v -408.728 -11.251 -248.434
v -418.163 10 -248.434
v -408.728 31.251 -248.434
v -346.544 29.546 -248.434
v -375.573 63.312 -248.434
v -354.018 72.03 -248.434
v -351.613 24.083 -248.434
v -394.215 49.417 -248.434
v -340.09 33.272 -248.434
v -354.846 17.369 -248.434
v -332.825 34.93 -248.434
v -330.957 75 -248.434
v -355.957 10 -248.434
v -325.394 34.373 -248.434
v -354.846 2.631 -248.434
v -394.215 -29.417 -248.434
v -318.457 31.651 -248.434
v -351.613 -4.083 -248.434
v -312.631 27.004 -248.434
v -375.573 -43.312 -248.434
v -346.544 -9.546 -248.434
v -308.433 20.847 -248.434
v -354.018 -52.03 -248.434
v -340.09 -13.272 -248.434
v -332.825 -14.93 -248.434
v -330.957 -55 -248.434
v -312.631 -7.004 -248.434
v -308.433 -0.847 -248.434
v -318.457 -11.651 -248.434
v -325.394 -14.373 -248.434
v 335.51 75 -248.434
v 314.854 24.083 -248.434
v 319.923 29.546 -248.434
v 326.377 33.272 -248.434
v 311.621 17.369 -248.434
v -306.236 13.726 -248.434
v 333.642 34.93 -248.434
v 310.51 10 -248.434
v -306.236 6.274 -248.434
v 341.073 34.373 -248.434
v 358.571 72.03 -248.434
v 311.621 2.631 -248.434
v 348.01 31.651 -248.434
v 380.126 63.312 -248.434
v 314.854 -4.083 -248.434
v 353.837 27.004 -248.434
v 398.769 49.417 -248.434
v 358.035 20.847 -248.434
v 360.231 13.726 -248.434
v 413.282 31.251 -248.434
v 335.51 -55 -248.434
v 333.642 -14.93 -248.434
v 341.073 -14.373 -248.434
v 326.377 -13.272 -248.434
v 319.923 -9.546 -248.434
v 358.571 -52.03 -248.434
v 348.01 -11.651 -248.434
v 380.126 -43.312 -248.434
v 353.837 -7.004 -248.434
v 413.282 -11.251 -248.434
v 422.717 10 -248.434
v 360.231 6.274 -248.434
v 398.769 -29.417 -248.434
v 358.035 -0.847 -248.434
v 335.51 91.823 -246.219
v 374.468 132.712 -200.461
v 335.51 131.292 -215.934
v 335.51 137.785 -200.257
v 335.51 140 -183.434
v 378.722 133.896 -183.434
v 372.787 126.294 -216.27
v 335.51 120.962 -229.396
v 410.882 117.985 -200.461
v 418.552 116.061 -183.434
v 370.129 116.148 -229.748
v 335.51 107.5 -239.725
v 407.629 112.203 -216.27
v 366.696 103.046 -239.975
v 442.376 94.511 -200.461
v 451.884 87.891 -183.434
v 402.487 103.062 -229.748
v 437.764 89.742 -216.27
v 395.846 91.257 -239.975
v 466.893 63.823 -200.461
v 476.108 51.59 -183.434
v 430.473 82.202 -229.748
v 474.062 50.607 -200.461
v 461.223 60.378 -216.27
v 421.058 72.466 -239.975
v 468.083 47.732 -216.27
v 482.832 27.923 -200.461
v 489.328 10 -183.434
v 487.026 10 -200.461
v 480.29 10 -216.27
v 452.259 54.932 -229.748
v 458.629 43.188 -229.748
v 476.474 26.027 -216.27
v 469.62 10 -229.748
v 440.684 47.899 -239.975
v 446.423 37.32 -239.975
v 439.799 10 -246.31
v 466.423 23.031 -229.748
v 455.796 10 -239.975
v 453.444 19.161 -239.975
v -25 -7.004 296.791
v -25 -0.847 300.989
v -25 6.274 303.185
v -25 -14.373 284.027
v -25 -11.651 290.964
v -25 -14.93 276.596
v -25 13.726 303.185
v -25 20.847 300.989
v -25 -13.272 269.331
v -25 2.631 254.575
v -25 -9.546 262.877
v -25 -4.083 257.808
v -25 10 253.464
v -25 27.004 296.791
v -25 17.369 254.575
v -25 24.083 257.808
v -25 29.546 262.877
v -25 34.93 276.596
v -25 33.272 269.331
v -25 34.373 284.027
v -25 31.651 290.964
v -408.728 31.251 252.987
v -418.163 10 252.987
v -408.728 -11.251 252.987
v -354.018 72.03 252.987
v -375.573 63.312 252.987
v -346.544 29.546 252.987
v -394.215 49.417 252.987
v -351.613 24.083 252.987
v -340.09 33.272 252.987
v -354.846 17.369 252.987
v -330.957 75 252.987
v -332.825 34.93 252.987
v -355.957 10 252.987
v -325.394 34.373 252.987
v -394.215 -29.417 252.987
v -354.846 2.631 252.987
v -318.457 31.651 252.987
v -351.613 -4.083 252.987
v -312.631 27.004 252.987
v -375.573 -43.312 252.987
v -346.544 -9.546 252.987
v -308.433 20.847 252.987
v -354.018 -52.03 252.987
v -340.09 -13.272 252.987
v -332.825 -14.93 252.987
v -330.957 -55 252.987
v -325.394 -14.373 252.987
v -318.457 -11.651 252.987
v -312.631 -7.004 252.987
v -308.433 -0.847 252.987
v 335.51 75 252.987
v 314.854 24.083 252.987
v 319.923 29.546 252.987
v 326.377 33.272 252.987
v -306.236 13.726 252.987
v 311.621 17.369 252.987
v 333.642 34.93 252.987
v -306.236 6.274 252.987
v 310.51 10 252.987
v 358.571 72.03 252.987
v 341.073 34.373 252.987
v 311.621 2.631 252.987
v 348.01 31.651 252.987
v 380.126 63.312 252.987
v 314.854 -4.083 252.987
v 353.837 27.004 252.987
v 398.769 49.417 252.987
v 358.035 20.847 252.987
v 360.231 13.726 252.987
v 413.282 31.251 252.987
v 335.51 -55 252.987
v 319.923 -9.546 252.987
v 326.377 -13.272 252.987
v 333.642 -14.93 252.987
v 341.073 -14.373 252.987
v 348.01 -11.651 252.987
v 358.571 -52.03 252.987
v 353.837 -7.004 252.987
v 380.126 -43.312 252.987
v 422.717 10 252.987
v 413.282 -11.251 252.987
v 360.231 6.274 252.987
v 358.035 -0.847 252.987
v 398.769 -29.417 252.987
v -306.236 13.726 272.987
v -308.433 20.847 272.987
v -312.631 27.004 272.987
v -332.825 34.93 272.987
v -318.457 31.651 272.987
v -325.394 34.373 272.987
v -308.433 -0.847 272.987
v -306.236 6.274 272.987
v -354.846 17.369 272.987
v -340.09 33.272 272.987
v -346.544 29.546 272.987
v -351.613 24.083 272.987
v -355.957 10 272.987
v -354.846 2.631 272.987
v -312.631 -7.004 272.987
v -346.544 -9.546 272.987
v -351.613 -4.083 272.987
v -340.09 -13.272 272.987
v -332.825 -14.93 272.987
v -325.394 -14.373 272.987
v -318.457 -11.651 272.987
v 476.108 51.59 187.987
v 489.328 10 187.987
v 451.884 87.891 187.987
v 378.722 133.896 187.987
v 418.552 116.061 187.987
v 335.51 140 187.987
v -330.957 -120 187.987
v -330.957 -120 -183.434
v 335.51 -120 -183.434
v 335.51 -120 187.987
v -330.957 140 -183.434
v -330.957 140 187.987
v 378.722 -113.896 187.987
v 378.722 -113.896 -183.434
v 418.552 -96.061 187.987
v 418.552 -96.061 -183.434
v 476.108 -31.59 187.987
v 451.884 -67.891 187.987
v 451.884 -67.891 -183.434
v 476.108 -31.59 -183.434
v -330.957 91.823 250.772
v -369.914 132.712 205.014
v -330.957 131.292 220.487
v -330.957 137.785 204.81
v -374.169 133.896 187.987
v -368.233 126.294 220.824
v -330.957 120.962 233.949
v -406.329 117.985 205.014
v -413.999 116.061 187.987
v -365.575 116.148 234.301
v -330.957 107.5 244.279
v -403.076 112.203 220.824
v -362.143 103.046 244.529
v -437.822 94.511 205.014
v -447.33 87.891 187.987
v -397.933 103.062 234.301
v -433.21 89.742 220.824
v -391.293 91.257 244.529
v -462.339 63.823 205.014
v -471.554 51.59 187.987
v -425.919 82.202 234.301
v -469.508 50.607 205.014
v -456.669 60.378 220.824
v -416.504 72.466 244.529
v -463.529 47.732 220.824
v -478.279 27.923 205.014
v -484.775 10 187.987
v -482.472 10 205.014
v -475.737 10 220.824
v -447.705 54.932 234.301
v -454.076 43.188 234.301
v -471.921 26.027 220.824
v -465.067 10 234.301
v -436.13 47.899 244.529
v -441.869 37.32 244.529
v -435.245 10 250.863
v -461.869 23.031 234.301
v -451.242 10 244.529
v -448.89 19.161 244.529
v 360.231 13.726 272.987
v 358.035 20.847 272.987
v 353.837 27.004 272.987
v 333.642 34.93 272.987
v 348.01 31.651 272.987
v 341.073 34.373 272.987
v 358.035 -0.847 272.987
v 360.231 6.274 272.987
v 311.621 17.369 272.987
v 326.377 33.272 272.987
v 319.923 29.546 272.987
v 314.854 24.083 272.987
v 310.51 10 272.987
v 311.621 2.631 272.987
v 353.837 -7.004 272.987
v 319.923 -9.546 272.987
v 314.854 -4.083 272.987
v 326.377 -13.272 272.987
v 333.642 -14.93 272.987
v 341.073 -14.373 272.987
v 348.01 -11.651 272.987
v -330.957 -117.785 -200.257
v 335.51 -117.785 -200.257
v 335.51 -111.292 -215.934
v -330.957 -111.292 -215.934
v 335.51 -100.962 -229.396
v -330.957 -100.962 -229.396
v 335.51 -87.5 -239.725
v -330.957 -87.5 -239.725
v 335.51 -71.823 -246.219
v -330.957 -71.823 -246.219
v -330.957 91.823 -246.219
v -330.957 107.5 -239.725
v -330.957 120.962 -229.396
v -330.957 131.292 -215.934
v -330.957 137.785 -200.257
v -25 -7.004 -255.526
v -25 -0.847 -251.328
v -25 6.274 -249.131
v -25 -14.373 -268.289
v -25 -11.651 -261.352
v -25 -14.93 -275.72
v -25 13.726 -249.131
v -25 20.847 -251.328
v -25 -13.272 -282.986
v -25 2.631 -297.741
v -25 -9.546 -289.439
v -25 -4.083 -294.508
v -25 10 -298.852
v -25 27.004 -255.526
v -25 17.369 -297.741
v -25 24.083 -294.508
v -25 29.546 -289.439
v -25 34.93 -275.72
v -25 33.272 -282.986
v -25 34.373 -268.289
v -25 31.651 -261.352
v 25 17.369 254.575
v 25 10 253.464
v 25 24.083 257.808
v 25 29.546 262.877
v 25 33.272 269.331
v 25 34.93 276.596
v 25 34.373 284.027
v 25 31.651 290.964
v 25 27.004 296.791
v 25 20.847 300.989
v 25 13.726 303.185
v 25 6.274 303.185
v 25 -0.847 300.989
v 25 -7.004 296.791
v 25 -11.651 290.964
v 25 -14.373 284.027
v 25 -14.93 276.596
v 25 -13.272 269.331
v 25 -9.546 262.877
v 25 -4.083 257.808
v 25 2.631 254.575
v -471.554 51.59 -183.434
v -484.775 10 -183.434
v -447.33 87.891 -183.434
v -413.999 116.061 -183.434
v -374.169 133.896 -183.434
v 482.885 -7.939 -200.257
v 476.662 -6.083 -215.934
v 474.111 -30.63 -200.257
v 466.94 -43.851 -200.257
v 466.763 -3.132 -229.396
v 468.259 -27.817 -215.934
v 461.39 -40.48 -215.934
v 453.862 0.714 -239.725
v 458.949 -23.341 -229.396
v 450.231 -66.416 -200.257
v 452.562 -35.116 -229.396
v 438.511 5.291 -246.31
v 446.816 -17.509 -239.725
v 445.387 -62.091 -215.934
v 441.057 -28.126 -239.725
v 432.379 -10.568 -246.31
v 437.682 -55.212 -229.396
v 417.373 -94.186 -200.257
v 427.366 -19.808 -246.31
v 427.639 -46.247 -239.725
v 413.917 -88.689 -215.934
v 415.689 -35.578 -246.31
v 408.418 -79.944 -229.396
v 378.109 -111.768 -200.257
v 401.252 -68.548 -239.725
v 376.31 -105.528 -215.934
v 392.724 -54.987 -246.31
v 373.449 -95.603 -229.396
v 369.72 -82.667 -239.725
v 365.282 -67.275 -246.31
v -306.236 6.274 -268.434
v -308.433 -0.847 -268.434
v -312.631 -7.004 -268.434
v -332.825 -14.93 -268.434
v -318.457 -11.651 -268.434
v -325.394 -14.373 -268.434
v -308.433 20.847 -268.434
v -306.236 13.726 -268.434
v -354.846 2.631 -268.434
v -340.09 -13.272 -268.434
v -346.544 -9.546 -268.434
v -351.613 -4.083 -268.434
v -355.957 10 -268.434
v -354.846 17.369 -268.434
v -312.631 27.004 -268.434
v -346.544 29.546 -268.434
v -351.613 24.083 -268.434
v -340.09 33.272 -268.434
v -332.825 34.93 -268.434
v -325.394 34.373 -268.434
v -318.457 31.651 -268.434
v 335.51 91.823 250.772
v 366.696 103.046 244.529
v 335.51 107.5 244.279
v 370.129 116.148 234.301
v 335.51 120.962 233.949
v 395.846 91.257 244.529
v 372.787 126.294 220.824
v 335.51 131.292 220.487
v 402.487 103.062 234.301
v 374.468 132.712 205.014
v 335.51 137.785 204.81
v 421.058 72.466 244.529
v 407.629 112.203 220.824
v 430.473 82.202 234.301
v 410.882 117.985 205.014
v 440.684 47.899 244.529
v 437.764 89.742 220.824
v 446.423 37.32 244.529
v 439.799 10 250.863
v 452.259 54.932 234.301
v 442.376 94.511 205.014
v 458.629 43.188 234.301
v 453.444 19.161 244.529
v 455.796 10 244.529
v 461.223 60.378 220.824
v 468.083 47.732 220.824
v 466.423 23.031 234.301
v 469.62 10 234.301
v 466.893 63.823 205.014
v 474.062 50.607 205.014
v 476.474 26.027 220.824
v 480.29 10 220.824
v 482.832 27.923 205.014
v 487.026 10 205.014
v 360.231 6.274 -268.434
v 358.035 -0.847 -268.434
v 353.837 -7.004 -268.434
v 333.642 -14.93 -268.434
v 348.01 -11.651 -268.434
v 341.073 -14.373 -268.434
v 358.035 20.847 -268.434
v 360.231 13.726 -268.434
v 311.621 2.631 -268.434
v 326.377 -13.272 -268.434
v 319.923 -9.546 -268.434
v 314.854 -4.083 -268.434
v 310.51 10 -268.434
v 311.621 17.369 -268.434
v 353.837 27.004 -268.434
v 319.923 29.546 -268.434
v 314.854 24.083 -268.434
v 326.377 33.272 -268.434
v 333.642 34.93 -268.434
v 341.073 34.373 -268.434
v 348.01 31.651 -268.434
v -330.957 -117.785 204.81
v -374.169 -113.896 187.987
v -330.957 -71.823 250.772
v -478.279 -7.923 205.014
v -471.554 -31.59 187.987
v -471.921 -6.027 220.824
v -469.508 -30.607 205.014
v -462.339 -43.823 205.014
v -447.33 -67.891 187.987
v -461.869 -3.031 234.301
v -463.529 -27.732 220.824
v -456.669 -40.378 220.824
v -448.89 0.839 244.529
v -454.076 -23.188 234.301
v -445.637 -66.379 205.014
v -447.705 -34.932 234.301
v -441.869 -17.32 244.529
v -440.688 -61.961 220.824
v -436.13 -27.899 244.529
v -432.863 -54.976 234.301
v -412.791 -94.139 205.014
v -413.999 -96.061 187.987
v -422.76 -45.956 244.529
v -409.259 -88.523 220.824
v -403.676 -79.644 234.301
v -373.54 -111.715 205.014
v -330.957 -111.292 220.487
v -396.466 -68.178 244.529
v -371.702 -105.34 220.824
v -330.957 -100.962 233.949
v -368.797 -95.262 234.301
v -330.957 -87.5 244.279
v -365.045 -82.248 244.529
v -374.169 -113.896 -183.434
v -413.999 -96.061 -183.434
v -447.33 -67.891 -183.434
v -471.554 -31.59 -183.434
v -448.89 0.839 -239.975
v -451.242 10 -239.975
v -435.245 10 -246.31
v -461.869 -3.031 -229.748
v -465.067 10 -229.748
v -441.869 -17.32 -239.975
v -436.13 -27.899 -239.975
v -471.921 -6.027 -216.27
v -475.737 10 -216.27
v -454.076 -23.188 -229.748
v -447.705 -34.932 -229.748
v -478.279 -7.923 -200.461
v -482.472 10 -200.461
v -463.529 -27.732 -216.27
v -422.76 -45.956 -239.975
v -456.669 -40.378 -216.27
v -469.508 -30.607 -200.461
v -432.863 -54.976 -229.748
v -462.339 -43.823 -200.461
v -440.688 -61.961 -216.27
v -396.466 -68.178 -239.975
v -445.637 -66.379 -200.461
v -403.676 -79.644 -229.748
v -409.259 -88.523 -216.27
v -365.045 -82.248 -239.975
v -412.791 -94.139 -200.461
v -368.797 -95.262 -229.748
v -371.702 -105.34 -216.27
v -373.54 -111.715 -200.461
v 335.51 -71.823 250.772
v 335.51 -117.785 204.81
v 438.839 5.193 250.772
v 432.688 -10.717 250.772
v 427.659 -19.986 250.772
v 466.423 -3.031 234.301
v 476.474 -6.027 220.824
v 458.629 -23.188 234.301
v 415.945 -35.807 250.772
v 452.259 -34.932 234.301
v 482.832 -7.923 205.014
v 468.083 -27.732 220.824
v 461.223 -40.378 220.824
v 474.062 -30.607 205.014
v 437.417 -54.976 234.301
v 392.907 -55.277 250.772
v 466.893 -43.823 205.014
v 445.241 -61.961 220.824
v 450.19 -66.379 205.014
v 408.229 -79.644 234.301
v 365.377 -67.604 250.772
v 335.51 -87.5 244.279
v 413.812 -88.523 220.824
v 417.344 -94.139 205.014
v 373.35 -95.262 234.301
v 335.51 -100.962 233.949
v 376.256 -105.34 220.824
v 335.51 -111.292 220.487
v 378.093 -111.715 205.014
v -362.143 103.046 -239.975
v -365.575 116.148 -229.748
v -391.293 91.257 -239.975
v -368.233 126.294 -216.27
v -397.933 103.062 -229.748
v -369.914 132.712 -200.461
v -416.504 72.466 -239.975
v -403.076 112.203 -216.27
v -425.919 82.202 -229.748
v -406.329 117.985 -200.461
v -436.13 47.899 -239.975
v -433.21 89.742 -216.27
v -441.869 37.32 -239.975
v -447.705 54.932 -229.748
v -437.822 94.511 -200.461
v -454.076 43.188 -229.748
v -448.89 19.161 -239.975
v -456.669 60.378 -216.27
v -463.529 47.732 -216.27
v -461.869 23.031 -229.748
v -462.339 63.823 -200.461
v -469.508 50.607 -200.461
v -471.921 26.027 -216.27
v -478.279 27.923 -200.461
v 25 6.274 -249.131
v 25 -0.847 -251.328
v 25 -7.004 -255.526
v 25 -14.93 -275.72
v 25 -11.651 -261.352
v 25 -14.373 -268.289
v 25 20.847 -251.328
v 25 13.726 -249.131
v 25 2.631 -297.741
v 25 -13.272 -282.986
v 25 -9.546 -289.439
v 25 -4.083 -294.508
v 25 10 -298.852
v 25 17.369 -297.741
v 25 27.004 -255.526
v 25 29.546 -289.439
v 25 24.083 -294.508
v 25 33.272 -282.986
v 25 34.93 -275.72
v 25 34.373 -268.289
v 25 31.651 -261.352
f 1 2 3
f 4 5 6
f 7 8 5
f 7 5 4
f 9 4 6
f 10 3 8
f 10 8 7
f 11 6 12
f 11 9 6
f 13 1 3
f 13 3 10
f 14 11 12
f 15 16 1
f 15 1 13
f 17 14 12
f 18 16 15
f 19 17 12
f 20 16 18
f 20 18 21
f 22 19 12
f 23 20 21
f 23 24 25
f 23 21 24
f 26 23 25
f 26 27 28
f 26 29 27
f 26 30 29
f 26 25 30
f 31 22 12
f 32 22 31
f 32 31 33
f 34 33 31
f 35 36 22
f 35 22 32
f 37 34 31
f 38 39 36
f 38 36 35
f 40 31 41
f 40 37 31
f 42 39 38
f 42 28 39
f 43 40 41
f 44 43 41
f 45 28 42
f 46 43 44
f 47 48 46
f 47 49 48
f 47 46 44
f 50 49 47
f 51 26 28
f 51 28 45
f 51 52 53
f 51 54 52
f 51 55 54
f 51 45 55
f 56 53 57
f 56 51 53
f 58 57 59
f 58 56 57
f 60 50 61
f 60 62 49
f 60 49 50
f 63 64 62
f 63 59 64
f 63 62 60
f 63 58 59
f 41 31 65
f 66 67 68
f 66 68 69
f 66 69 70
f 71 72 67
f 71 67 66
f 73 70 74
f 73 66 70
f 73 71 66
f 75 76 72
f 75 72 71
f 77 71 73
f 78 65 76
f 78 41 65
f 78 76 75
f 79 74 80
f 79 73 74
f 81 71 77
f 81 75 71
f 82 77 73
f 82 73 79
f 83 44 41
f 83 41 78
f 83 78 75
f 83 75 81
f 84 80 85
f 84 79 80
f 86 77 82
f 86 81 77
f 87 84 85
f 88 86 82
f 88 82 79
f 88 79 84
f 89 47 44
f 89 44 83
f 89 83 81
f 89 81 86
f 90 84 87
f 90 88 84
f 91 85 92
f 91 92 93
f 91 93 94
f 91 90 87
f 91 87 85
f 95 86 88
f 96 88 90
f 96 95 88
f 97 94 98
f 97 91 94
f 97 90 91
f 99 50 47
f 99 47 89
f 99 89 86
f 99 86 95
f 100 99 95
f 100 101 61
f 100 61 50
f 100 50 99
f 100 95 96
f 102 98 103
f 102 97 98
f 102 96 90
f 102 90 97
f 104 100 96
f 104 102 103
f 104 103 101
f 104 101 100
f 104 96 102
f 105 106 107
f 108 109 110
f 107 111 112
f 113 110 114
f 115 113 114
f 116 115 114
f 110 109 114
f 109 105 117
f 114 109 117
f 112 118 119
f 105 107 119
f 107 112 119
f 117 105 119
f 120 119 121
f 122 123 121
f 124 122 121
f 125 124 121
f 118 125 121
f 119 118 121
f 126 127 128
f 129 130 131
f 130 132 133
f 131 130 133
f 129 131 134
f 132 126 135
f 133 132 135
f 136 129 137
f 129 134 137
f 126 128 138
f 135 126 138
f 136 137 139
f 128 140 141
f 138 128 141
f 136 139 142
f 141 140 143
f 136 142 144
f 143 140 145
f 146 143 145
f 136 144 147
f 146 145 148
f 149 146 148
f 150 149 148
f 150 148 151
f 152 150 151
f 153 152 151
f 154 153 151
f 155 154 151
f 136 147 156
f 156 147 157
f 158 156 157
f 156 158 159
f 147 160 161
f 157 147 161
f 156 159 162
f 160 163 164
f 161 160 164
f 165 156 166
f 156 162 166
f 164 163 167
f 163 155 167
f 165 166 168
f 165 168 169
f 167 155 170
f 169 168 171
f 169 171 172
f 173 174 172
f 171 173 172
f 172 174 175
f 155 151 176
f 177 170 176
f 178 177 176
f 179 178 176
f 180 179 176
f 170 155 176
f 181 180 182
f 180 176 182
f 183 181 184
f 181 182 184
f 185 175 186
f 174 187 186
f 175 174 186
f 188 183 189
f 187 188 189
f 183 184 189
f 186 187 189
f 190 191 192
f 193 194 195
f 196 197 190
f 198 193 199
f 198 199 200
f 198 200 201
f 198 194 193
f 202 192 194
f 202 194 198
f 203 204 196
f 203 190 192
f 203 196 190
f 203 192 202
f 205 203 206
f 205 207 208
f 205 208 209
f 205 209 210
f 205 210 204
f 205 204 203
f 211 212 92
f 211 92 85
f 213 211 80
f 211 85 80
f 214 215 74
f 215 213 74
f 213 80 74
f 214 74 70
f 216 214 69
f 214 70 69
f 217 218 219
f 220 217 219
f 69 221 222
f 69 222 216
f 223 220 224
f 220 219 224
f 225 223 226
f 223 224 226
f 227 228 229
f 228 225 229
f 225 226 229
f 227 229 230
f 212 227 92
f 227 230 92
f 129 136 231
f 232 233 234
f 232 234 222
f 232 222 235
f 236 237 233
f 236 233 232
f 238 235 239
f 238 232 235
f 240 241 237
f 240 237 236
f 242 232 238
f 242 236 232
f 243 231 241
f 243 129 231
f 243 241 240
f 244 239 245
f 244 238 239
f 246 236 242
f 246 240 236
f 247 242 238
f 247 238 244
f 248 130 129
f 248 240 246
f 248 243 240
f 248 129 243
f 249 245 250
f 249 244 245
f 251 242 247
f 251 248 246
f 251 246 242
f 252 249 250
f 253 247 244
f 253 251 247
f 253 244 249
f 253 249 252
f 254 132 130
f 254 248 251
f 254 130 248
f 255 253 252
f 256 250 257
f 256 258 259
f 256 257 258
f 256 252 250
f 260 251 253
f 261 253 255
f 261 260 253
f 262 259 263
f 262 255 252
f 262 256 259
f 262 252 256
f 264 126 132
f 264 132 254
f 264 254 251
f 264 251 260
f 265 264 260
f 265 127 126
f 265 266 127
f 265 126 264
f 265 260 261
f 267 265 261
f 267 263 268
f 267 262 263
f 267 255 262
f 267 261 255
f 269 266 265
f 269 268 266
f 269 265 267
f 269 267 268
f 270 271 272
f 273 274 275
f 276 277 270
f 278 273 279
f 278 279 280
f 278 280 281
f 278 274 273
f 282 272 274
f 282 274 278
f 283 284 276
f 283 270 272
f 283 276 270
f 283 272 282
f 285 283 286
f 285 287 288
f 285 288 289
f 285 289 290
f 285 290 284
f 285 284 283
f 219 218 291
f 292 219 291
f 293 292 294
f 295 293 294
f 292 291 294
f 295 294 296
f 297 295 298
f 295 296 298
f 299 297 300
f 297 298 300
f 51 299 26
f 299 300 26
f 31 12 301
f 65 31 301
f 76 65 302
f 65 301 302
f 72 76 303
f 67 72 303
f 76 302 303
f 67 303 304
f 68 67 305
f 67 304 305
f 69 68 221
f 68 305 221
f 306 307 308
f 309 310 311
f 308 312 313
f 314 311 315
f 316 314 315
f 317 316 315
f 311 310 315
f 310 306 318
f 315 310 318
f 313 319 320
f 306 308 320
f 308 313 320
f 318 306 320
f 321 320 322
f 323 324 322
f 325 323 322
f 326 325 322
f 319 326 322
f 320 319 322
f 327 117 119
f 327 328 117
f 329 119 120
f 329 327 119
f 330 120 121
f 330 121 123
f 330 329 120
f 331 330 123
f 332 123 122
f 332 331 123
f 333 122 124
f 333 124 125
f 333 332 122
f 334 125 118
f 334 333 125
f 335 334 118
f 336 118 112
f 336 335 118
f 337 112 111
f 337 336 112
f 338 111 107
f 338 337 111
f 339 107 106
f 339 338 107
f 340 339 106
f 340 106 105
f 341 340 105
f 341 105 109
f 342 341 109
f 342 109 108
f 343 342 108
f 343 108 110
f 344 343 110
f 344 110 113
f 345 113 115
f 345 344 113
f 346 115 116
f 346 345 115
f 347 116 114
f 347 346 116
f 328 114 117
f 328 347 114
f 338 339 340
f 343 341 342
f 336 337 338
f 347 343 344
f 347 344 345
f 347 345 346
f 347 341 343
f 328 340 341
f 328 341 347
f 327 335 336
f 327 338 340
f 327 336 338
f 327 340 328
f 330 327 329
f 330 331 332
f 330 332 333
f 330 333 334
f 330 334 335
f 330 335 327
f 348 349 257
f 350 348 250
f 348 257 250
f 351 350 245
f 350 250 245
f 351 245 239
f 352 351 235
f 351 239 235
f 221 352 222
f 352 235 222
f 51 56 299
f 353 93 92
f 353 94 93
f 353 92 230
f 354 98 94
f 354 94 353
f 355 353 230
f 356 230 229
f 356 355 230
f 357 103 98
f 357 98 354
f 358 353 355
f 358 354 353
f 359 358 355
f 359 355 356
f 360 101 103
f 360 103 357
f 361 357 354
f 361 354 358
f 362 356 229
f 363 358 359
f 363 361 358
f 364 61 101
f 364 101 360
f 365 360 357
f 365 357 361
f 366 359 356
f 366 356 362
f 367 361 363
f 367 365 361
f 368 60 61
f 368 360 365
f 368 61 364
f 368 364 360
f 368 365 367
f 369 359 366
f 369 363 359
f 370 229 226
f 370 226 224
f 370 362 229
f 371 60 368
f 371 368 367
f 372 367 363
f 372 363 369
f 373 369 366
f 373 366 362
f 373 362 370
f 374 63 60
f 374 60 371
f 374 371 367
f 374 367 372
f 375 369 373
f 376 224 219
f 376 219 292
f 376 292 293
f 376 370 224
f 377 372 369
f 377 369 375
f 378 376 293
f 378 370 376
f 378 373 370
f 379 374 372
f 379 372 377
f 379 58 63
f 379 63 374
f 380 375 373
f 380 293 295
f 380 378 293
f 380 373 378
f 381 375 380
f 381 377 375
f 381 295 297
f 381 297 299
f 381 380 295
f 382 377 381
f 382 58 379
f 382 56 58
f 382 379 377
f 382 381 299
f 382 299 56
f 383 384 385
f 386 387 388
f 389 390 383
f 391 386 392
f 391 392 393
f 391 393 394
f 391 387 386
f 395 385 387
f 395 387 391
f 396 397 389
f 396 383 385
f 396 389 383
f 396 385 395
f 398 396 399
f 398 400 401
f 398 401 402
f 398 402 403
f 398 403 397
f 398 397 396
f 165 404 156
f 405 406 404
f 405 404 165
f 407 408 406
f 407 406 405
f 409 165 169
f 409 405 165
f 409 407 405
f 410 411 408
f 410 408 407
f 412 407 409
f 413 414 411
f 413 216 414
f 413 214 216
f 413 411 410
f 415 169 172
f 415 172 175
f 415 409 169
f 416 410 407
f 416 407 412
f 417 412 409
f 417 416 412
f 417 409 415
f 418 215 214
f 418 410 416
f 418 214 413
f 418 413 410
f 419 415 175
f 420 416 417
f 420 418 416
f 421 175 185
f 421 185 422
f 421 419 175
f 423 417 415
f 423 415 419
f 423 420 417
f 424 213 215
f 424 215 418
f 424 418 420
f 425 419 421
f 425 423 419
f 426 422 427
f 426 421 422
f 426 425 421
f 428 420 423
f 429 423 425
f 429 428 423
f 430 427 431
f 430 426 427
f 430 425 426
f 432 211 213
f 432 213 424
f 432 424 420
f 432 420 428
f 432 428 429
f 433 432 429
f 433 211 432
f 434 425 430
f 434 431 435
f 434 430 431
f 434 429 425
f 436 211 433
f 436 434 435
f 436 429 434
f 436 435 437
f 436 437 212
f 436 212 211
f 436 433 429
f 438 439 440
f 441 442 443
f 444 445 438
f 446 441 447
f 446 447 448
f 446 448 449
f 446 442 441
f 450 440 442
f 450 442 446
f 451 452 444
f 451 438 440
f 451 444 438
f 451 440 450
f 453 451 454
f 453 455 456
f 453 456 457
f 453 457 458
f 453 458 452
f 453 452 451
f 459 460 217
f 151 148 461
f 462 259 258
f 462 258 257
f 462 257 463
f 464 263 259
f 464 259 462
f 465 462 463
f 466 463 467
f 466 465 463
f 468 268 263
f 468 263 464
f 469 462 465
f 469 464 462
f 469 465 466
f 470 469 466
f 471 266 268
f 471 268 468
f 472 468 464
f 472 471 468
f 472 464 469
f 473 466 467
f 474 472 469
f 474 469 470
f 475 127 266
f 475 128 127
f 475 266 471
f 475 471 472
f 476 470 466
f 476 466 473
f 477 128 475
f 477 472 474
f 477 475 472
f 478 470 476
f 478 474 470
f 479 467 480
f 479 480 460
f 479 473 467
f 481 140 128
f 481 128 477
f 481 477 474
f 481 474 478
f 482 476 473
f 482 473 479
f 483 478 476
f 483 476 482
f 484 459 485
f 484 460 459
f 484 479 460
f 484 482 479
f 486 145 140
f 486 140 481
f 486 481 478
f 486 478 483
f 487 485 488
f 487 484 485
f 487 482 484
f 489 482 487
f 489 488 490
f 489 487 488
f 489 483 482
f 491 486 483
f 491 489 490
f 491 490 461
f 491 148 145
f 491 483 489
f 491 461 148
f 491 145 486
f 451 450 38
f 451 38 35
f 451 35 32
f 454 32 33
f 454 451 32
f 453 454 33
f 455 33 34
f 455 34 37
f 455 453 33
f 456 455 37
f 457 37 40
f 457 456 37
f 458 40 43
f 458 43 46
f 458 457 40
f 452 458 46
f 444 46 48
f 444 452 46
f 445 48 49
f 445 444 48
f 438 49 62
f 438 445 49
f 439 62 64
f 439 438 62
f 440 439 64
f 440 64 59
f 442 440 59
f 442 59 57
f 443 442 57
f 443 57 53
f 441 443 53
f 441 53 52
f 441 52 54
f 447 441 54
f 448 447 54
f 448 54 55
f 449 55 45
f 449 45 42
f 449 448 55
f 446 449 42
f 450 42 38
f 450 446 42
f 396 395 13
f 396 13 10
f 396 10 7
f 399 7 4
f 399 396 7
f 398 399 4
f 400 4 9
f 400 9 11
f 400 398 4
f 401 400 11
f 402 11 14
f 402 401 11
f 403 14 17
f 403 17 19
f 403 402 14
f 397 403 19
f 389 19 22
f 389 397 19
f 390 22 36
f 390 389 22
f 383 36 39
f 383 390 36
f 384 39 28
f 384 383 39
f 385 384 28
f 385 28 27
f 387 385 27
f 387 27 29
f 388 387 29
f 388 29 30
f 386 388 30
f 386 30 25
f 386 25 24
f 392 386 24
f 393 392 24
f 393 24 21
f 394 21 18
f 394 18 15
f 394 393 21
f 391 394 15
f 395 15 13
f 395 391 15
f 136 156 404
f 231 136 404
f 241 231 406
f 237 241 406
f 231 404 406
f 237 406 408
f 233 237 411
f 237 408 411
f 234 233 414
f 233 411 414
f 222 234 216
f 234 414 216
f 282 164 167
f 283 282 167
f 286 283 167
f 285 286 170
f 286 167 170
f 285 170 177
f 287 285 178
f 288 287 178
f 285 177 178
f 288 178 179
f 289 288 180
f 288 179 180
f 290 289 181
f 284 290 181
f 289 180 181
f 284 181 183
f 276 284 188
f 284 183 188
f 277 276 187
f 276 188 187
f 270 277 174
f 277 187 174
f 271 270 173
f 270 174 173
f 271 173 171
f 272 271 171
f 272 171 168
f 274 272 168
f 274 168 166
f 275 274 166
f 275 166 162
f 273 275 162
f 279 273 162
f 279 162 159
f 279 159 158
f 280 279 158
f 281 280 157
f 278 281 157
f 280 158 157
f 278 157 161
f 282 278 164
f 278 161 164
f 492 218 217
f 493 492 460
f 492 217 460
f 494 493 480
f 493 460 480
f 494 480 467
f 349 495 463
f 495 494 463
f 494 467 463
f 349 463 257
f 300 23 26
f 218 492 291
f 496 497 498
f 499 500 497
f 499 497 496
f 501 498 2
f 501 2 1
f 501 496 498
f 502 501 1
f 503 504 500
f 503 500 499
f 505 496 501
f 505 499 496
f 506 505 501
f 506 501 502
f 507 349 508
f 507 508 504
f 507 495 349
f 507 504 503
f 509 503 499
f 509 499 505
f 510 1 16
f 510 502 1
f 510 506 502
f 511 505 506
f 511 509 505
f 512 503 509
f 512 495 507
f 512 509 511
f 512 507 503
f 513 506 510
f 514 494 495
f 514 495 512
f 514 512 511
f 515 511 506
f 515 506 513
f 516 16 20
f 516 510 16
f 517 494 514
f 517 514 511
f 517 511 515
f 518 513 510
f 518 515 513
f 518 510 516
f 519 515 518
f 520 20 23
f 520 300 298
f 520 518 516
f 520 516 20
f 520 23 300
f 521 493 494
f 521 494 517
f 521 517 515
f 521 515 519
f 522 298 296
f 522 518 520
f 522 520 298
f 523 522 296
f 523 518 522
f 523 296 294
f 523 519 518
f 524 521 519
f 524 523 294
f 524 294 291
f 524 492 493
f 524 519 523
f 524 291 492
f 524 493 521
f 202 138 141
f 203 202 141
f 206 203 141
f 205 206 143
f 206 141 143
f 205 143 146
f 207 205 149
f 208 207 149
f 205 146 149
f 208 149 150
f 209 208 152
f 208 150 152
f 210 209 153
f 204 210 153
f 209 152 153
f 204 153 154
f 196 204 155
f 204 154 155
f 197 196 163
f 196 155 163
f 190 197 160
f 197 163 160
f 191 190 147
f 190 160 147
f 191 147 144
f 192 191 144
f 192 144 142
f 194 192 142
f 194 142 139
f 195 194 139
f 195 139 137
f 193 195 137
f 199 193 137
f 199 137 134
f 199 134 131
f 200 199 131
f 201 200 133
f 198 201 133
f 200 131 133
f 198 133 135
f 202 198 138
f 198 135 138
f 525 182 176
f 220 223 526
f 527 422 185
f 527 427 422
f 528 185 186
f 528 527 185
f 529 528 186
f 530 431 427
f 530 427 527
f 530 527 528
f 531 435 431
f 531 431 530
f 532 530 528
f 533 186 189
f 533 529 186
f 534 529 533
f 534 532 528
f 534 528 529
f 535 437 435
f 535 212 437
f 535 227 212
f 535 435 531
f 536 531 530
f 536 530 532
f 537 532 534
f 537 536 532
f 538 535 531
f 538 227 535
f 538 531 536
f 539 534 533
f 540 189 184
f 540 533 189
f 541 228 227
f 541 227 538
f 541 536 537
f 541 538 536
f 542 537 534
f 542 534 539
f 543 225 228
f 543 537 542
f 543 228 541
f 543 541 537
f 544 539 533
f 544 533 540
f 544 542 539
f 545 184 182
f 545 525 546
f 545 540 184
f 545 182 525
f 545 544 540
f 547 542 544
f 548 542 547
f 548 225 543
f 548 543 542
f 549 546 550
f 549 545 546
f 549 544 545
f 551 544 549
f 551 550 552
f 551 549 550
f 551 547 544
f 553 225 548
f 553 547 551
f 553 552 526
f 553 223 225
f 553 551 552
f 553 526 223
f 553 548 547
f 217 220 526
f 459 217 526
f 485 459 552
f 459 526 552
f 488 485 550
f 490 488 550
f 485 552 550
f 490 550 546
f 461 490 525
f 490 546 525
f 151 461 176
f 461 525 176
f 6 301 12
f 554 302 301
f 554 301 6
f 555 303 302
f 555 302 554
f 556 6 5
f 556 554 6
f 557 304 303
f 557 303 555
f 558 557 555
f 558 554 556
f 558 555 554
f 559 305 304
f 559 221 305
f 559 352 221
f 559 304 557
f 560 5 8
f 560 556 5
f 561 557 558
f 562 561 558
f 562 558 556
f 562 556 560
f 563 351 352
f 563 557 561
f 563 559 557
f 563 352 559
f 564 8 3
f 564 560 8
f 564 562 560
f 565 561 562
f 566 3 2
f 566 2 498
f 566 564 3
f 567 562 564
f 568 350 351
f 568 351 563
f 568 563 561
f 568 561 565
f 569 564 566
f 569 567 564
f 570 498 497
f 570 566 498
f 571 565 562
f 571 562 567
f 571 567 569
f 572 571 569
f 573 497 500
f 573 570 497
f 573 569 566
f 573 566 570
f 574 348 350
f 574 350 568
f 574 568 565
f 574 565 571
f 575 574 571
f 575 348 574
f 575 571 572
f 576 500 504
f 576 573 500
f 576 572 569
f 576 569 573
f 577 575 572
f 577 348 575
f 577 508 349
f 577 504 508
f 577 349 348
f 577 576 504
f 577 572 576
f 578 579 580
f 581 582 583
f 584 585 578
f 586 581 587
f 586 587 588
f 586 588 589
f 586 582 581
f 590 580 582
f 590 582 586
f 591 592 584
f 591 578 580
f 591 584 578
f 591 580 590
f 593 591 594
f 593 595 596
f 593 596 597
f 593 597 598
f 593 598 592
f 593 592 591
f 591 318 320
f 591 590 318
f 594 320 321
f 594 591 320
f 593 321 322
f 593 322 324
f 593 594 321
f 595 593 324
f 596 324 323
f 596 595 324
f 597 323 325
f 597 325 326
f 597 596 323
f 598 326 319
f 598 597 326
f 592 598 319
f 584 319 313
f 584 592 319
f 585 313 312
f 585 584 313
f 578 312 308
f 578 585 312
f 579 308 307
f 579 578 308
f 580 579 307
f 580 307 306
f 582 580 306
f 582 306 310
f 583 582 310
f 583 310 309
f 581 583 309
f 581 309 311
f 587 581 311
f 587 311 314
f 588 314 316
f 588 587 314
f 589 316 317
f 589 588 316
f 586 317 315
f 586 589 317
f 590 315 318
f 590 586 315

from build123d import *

# Parameters (mm, degrees)
SKETCH1_W             = 75.266699621
SKETCH1_H             = 38.570835393
BOSS_EXTRUDE1_DEPTH   = 20
FILLET1_R             = 12
FILLET3_R             = 5
SCALE1_SCALE          = 13
SKETCH2_R             = 25
BOSS_EXTRUDE2_DEPTH   = 20
BOSS_EXTRUDE3_START   = 20
SKETCH3_R             = 25
BOSS_EXTRUDE3_DEPTH   = 20
SKETCH6_R             = 25
BOSS_EXTRUDE5_DEPTH   = 25
BOSS_EXTRUDE5_2_DEPTH = 25


with BuildPart() as part:
    # Sketch1 → Boss-Extrude1 (new body)
    with BuildSketch(Plane(origin=(0, 0, 0), x_dir=(1, 0, 0), z_dir=(0, 1, 0))):
        with Locations((2.2767507, -2.2767507)):
            Rectangle(SKETCH1_W, SKETCH1_H)
    extrude(amount=BOSS_EXTRUDE1_DEPTH)

    # Fillet1
    # the kernel refuses this fillet: 12 mm, written as the material it takes off along each edge
    with BuildSketch(Plane(origin=(39.910100511, 20, -47.008666996), x_dir=(0, -1, 0), z_dir=(0, 0, 1)), Plane(origin=(-35.35659911, 20, 51.562168397), x_dir=(0, -1, 0), z_dir=(0, 0, -1))) as fillet1_piece_1:
        with BuildLine():
            CenterArc((FILLET1_R, -FILLET1_R), FILLET1_R, 90, 90)
            Line((0, -FILLET1_R), (0, 0))
            Line((0, 0), (FILLET1_R, 0))
        make_face()
    extrude(amount=98.570835393, mode=Mode.SUBTRACT)
    with BuildSketch(Plane(origin=(39.910100511, 0, -47.008666996), x_dir=(0, 1, 0), z_dir=(0, 0, 1)), Plane(origin=(-35.35659911, 0, 51.562168397), x_dir=(0, 1, 0), z_dir=(0, 0, -1))) as fillet1_piece_2:
        with BuildLine():
            CenterArc((FILLET1_R, FILLET1_R), FILLET1_R, 180, 90)
            Line((0, FILLET1_R), (0, 0))
            Line((0, 0), (FILLET1_R, 0))
        make_face()
    extrude(amount=98.570835393, mode=Mode.SUBTRACT)

    # Fillet3
    # the kernel refuses this fillet: 5 mm, written as the material it takes off along each edge
    with BuildSketch(Plane(origin=(27.910100511, 0, 21.562168397), x_dir=(0, 0, -1), z_dir=(-1, 0, 0)), Plane(origin=(-23.35659911, 20, -17.008666996), x_dir=(0, -1, 0), z_dir=(1, 0, 0))) as fillet3_piece_1:
        with BuildLine():
            CenterArc((FILLET3_R, -FILLET3_R), FILLET3_R, 90, 90)
            Line((0, -FILLET3_R), (0, 0))
            Line((0, 0), (FILLET3_R, 0))
        make_face()
    extrude(amount=51.266699621, mode=Mode.SUBTRACT)
    with BuildSketch(Plane(origin=(27.910100511, 20, 21.562168397), x_dir=(0, 0, -1), z_dir=(-1, 0, 0)), Plane(origin=(-23.35659911, 0, -17.008666996), x_dir=(0, 1, 0), z_dir=(1, 0, 0))) as fillet3_piece_2:
        with BuildLine():
            CenterArc((FILLET3_R, FILLET3_R), FILLET3_R, 180, 90)
            Line((0, FILLET3_R), (0, 0))
            Line((0, 0), (FILLET3_R, 0))
        make_face()
    extrude(amount=51.266699621, mode=Mode.SUBTRACT)
    with BuildSketch(Plane(origin=(27.910100511, 12, 21.562168397), x_dir=(0.6413402265128234, 0.7672566153878899, 0), z_dir=(-0.7672566153878899, 0.6413402265128234, 0))) as fillet3_piece_3:
        with BuildLine():
            CenterArc((12 - FILLET3_R, FILLET3_R), FILLET3_R, 270, 90)
            Line((12 - FILLET3_R, 0), (12, 0))
            Line((12, 0), (12, FILLET3_R))
        make_face()
    revolve(axis=Axis((27.910100511, 12, 21.562168397), (0, 0, -1)), revolution_arc=140.108170437, mode=Mode.SUBTRACT)
    with BuildSketch(Plane(origin=(27.910100511, 8, 21.562168397), x_dir=(0, 1, 0), z_dir=(-1, 0, 0))) as fillet3_piece_4:
        with BuildLine():
            CenterArc((12 - FILLET3_R, FILLET3_R), FILLET3_R, 270, 90)
            Line((12 - FILLET3_R, 0), (12, 0))
            Line((12, 0), (12, FILLET3_R))
        make_face()
    revolve(axis=Axis((27.910100511, 8, 21.562168397), (0, 0, -1)), revolution_arc=140.108170437, mode=Mode.SUBTRACT)
    with BuildSketch(Plane(origin=(-23.35659911, 8, 21.562168397), x_dir=(0, 1, 0), z_dir=(1, 0, 0))) as fillet3_piece_5:
        with BuildLine():
            CenterArc((12 - FILLET3_R, -FILLET3_R), FILLET3_R, 0, 90)
            Line((12 - FILLET3_R, 0), (12, 0))
            Line((12, 0), (12, -FILLET3_R))
        make_face()
    revolve(axis=Axis((-23.35659911, 8, 21.562168397), (0, 0, 1)), revolution_arc=140.108170437, mode=Mode.SUBTRACT)
    with BuildSketch(Plane(origin=(-23.35659911, 12, 21.562168397), x_dir=(-0.6413402265128229, 0.7672566153878903, 0), z_dir=(0.7672566153878903, 0.6413402265128229, 0))) as fillet3_piece_6:
        with BuildLine():
            CenterArc((12 - FILLET3_R, -FILLET3_R), FILLET3_R, 0, 90)
            Line((12 - FILLET3_R, 0), (12, 0))
            Line((12, 0), (12, -FILLET3_R))
        make_face()
    revolve(axis=Axis((-23.35659911, 12, 21.562168397), (0, 0, 1)), revolution_arc=140.108170437, mode=Mode.SUBTRACT)
    with BuildSketch(Plane(origin=(27.910100511, 12, -17.008666996), x_dir=(0.6413402265128234, 0.7672566153878899, 0), z_dir=(-0.7672566153878899, 0.6413402265128234, 0))) as fillet3_piece_7:
        with BuildLine():
            CenterArc((12 - FILLET3_R, -FILLET3_R), FILLET3_R, 0, 90)
            Line((12, -FILLET3_R), (12, 0))
            Line((12, 0), (12 - FILLET3_R, 0))
        make_face()
    revolve(axis=Axis((27.910100511, 12, -17.008666996), (0, 0, -1)), revolution_arc=140.108170437, mode=Mode.SUBTRACT)
    with BuildSketch(Plane(origin=(27.910100511, 8, -17.008666996), x_dir=(0, 1, 0), z_dir=(-1, 0, 0))) as fillet3_piece_8:
        with BuildLine():
            CenterArc((12 - FILLET3_R, -FILLET3_R), FILLET3_R, 0, 90)
            Line((12, -FILLET3_R), (12, 0))
            Line((12, 0), (12 - FILLET3_R, 0))
        make_face()
    revolve(axis=Axis((27.910100511, 8, -17.008666996), (0, 0, -1)), revolution_arc=140.108170437, mode=Mode.SUBTRACT)
    with BuildSketch(Plane(origin=(-23.35659911, 8, -17.008666996), x_dir=(0, 1, 0), z_dir=(1, 0, 0))) as fillet3_piece_9:
        with BuildLine():
            CenterArc((12 - FILLET3_R, FILLET3_R), FILLET3_R, 270, 90)
            Line((12, FILLET3_R), (12, 0))
            Line((12, 0), (12 - FILLET3_R, 0))
        make_face()
    revolve(axis=Axis((-23.35659911, 8, -17.008666996), (0, 0, 1)), revolution_arc=140.108170437, mode=Mode.SUBTRACT)
    with BuildSketch(Plane(origin=(-23.35659911, 12, -17.008666996), x_dir=(-0.6413402265128236, 0.7672566153878898, 0), z_dir=(0.7672566153878898, 0.6413402265128236, 0))) as fillet3_piece_10:
        with BuildLine():
            CenterArc((12 - FILLET3_R, FILLET3_R), FILLET3_R, 270, 90)
            Line((12, FILLET3_R), (12, 0))
            Line((12, 0), (12 - FILLET3_R, 0))
        make_face()
    revolve(axis=Axis((-23.35659911, 12, -17.008666996), (0, 0, 1)), revolution_arc=140.108170437, mode=Mode.SUBTRACT)


with BuildPart() as part_1:
    # Scale1: scaled about (2.276750701, 9.999999998, 2.2767507)
    add(part.part.scale(SCALE1_SCALE).moved(Location((-27.321008412, -119.999999976, -27.3210084))))

    # Sketch2 → Boss-Extrude2 (add)
    with BuildSketch(Plane.XY.offset(252.987180755)):
        with Locations(Location((-330.956796836, 10, 0), (0, 0, 180))):
            Circle(SKETCH2_R)
        with Locations(Location((335.510298237, 10, 0), (0, 0, 180))):
            Circle(SKETCH2_R)
    extrude(amount=BOSS_EXTRUDE2_DEPTH)

    # Sketch3 → Boss-Extrude3 (add)
    with BuildSketch(Plane(origin=(0, 0, -248.433679354), x_dir=(-1, 0, 0), z_dir=(0, 0, -1)).offset(BOSS_EXTRUDE3_START)):
        with Locations((-335.510298237, 10)):
            Circle(SKETCH3_R)
        with Locations((330.956796836, 10)):
            Circle(SKETCH3_R)
    extrude(amount=-BOSS_EXTRUDE3_DEPTH)


with BuildPart() as body_2:
    # Sketch6 → Boss-Extrude5 (new, symmetric)
    with BuildSketch(Plane(origin=(0, 0, 0), x_dir=(0, 0, -1), z_dir=(1, 0, 0))):
        with Locations((-278.464422179, 10)):
            Circle(SKETCH6_R)
    extrude(amount=BOSS_EXTRUDE5_DEPTH, both=True)


with BuildPart() as body_3:
    # Sketch6 → Boss-Extrude5 2 (new, symmetric)
    with BuildSketch(Plane(origin=(0, 0, 0), x_dir=(0, 0, -1), z_dir=(1, 0, 0))):
        with Locations((273.851995382, 10)):
            Circle(SKETCH6_R)
    extrude(amount=BOSS_EXTRUDE5_2_DEPTH, both=True)


solid = Compound([part_1.part, body_2.part, body_3.part])
